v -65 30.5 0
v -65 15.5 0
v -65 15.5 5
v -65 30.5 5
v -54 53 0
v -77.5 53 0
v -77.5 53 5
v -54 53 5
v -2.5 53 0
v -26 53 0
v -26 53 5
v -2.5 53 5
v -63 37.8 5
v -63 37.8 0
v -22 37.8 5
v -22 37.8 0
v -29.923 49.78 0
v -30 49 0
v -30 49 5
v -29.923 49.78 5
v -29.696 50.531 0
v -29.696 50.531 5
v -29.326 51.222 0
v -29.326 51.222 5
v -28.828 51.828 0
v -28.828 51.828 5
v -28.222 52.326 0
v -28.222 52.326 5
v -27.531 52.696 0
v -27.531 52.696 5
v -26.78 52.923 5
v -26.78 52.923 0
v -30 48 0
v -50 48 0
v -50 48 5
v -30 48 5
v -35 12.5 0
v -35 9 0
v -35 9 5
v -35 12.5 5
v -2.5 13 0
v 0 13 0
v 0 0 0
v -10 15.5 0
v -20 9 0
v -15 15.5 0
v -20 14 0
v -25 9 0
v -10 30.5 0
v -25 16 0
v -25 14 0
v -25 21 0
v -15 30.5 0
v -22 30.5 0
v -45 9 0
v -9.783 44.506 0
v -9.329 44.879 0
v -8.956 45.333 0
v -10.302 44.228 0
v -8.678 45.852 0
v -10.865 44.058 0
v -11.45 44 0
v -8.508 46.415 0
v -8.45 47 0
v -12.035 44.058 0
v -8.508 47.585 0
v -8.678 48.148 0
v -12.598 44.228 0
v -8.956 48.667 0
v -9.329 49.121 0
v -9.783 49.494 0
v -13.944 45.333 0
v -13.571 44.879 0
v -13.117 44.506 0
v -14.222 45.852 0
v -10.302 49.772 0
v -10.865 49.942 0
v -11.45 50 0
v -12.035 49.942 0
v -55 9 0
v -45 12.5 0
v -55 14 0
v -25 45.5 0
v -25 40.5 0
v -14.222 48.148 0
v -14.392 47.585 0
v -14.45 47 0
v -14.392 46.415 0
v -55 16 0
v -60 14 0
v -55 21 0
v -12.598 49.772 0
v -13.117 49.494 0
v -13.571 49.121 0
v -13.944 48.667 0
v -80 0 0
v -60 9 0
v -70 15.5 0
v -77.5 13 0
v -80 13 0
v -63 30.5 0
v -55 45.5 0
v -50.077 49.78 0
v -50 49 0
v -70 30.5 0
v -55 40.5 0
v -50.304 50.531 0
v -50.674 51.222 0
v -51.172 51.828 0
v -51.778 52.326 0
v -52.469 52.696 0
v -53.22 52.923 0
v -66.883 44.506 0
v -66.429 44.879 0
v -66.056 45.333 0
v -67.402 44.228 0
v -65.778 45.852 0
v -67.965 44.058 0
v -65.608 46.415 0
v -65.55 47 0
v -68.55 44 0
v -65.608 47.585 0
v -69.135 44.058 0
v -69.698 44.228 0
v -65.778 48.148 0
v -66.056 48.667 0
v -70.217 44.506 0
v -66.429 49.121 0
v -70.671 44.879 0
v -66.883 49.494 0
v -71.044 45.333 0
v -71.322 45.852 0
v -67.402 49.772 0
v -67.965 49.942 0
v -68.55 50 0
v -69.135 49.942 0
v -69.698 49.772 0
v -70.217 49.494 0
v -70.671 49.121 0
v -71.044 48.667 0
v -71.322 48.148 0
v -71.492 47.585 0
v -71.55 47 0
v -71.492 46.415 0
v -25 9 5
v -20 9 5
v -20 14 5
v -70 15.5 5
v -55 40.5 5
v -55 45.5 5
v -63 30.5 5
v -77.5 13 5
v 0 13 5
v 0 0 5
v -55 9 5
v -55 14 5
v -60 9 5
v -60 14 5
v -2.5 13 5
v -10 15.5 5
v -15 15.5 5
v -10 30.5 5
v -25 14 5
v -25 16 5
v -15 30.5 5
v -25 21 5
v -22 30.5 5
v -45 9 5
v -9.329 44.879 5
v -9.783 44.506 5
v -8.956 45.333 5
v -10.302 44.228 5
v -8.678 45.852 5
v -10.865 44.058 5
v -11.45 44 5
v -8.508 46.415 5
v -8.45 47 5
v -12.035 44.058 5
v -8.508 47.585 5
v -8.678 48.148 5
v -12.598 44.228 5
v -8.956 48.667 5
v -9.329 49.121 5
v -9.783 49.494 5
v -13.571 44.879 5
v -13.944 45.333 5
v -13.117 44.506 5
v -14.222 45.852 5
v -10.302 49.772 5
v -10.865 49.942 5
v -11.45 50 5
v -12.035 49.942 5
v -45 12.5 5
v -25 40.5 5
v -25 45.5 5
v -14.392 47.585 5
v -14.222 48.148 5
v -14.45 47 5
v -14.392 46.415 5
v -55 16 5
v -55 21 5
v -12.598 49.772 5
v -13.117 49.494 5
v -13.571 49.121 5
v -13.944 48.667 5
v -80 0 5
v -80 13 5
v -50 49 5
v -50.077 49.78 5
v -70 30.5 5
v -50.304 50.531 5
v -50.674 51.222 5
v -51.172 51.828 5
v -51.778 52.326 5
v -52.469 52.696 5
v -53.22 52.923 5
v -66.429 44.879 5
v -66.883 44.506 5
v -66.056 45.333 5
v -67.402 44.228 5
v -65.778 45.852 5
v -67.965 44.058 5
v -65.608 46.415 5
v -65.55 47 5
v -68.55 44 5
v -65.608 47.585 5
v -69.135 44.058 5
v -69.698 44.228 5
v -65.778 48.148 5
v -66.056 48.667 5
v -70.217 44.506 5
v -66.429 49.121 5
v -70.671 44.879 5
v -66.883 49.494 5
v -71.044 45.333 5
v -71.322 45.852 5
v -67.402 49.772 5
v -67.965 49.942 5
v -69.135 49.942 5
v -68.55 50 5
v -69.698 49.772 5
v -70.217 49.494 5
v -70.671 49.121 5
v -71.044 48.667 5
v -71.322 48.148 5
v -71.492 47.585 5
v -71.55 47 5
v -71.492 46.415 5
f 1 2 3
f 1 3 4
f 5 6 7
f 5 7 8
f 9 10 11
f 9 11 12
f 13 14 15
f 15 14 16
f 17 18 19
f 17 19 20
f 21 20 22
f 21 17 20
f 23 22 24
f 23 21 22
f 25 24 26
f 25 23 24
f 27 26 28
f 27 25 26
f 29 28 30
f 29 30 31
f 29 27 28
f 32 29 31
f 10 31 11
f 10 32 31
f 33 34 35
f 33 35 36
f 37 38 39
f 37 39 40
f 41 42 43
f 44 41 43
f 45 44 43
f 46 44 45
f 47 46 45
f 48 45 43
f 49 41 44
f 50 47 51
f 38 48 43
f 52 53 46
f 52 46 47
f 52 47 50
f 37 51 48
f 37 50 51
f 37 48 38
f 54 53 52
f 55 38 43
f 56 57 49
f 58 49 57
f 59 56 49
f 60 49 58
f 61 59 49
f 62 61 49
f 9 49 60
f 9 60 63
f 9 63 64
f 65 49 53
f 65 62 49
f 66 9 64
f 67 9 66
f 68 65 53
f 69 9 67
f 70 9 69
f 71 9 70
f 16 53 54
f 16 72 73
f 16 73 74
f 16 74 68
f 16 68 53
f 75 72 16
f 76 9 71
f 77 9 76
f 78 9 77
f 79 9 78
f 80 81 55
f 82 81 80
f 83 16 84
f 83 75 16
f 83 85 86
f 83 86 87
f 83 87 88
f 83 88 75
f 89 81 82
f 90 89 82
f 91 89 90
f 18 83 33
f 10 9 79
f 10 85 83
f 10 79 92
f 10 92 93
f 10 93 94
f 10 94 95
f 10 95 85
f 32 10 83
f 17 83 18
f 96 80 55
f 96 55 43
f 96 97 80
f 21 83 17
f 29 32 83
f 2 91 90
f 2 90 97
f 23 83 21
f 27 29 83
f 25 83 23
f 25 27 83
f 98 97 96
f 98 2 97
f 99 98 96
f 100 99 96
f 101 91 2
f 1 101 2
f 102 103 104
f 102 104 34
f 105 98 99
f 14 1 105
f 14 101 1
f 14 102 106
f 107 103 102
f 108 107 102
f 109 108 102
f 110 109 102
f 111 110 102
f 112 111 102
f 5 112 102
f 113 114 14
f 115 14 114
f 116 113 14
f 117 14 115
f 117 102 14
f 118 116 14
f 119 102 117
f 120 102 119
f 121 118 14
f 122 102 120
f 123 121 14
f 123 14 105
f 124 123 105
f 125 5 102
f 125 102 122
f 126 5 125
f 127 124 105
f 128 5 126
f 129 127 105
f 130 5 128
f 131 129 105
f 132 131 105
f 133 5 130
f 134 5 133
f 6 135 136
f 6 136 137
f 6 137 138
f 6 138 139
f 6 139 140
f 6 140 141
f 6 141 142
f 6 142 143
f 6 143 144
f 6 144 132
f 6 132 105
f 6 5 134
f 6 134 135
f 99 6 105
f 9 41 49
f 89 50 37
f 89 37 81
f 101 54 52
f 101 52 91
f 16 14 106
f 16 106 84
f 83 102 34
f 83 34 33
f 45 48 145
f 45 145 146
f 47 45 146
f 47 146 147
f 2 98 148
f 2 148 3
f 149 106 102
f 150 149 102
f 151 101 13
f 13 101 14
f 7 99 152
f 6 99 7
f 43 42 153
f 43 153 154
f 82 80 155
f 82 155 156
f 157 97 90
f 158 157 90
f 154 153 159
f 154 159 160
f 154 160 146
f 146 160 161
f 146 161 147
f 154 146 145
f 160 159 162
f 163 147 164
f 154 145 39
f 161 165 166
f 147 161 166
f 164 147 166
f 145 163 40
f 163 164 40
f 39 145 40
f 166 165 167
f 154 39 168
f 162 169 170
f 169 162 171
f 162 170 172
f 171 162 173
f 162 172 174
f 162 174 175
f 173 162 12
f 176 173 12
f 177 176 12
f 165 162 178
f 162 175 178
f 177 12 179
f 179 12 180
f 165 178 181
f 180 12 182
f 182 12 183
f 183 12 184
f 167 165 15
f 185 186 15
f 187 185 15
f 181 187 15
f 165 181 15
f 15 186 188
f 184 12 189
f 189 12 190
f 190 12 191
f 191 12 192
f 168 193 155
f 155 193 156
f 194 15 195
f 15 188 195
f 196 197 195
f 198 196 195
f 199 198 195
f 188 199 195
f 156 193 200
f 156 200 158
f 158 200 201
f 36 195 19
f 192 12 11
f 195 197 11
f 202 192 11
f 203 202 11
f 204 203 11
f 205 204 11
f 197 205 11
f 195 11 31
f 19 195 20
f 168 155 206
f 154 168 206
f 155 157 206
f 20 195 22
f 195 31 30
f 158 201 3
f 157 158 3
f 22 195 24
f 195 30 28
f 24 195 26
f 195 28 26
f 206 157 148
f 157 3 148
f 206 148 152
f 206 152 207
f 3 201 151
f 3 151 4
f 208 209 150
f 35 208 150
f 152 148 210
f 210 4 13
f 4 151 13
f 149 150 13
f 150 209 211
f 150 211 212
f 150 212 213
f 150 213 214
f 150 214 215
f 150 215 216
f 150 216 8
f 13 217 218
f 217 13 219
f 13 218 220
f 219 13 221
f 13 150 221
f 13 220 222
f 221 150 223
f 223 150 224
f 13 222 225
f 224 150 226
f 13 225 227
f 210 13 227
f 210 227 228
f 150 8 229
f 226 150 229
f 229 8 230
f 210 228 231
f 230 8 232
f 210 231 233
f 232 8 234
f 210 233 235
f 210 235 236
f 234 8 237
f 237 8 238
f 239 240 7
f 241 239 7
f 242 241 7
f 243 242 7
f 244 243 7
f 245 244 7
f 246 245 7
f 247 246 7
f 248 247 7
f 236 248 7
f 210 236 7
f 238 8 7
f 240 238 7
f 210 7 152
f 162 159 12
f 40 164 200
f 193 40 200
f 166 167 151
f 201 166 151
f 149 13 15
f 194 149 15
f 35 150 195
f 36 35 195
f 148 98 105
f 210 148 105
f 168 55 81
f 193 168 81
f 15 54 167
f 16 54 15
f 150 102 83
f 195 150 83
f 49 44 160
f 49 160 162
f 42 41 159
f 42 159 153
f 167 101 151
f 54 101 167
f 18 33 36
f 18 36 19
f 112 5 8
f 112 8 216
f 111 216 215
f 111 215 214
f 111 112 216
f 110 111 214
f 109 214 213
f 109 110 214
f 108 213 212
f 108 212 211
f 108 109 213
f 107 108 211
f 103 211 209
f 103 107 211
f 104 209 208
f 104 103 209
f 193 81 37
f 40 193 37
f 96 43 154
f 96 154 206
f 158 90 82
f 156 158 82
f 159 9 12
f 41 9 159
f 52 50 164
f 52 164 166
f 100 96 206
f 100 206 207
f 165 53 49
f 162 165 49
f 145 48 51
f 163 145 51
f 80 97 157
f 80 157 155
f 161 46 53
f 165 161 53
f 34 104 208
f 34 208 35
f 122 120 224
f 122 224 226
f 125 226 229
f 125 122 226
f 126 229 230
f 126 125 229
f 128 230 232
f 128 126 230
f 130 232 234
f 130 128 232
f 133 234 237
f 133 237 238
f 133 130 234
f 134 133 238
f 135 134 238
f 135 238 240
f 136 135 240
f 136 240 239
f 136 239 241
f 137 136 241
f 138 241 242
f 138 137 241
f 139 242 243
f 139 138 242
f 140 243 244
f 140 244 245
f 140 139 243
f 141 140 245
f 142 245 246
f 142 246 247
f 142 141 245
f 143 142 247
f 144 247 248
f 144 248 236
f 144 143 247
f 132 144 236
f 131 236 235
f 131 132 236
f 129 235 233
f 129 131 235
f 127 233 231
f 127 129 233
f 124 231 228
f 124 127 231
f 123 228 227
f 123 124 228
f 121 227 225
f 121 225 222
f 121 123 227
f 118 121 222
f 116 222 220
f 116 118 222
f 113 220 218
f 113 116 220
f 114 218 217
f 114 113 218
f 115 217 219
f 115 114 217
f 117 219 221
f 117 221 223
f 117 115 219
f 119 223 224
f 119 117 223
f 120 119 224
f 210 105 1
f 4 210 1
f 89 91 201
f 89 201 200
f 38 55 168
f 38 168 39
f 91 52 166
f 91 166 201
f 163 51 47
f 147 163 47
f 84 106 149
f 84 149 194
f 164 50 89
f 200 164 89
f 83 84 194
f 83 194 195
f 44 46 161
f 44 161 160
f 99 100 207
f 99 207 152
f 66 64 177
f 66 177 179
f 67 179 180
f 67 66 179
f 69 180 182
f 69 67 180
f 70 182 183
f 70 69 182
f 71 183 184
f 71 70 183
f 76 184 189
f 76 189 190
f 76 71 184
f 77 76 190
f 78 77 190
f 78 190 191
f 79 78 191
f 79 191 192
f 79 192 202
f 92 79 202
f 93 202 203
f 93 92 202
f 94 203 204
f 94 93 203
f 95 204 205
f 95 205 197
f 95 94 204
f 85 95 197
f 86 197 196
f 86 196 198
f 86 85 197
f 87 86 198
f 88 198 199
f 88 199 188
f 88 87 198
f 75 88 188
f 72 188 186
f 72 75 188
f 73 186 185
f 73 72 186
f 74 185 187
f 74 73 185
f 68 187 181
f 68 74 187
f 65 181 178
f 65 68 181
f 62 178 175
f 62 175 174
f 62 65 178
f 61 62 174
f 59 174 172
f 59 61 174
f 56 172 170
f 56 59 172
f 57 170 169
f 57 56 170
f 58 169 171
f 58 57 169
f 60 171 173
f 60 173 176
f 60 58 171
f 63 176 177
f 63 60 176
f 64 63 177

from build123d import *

# Parameters (mm, degrees)
SKETCH_1_R      = 3
SKETCH_1_W      = 30
SKETCH_1_H      = 5
SKETCH_1_W_2    = 5
SKETCH_1_H_2    = 15
SKETCH_1_W_3    = 10
SKETCH_1_H_3    = 3.5
SKETCH_1_W_4    = 41
SKETCH_1_H_4    = 7.3
EXTRUDE_1_DEPTH = 5


with BuildPart() as part:
    # 草图1 → 凸台-拉伸1 (new body)
    with BuildSketch(Plane.XY):
        with BuildLine():
            Line((0, 0), (-80, 0))
            Line((-80, 0), (-80, 13))
            Line((-80, 13), (-77.5, 13))
            Line((-77.5, 13), (-77.5, 53))
            Line((-77.5, 53), (-54, 53))
            ThreePointArc((-54, 53), (-51.171572875, 51.828427125), (-50, 49))
            Line((-50, 49), (-50, 48))
            Line((-50, 48), (-30, 48))
            Line((-30, 48), (-30, 49))
            ThreePointArc((-30, 49), (-28.828427125, 51.828427125), (-26, 53))
            Line((-26, 53), (-2.5, 53))
            Line((-2.5, 53), (-2.5, 13))
            Line((-2.5, 13), (0, 13))
            Line((0, 13), (0, 0))
        make_face()
        with Locations((-68.55, 47)):
            Circle(SKETCH_1_R, mode=Mode.SUBTRACT)
        with Locations((-11.45, 47)):
            Circle(SKETCH_1_R, mode=Mode.SUBTRACT)
        with Locations((-40, 43)):
            Rectangle(SKETCH_1_W, SKETCH_1_H, mode=Mode.SUBTRACT)
        with Locations((-67.5, 23)):
            Rectangle(SKETCH_1_W_2, SKETCH_1_H_2, mode=Mode.SUBTRACT)
        with Locations((-12.5, 23)):
            Rectangle(SKETCH_1_W_2, SKETCH_1_H_2, mode=Mode.SUBTRACT)
        Polygon((-55, 16), (-50, 16), (-30, 16), (-25, 16), (-25, 21), (-55, 21), align=None, mode=Mode.SUBTRACT)
        with Locations((-57.5, 11.5)):
            Rectangle(SKETCH_1_W_2, SKETCH_1_H, mode=Mode.SUBTRACT)
        with Locations((-22.5, 11.5)):
            Rectangle(SKETCH_1_W_2, SKETCH_1_H, mode=Mode.SUBTRACT)
        with Locations((-40, 10.75)):
            Rectangle(SKETCH_1_W_3, SKETCH_1_H_3, mode=Mode.SUBTRACT)
        with Locations((-42.5, 34.15)):
            Rectangle(SKETCH_1_W_4, SKETCH_1_H_4, mode=Mode.SUBTRACT)
    extrude(amount=EXTRUDE_1_DEPTH)


solid = part.part
